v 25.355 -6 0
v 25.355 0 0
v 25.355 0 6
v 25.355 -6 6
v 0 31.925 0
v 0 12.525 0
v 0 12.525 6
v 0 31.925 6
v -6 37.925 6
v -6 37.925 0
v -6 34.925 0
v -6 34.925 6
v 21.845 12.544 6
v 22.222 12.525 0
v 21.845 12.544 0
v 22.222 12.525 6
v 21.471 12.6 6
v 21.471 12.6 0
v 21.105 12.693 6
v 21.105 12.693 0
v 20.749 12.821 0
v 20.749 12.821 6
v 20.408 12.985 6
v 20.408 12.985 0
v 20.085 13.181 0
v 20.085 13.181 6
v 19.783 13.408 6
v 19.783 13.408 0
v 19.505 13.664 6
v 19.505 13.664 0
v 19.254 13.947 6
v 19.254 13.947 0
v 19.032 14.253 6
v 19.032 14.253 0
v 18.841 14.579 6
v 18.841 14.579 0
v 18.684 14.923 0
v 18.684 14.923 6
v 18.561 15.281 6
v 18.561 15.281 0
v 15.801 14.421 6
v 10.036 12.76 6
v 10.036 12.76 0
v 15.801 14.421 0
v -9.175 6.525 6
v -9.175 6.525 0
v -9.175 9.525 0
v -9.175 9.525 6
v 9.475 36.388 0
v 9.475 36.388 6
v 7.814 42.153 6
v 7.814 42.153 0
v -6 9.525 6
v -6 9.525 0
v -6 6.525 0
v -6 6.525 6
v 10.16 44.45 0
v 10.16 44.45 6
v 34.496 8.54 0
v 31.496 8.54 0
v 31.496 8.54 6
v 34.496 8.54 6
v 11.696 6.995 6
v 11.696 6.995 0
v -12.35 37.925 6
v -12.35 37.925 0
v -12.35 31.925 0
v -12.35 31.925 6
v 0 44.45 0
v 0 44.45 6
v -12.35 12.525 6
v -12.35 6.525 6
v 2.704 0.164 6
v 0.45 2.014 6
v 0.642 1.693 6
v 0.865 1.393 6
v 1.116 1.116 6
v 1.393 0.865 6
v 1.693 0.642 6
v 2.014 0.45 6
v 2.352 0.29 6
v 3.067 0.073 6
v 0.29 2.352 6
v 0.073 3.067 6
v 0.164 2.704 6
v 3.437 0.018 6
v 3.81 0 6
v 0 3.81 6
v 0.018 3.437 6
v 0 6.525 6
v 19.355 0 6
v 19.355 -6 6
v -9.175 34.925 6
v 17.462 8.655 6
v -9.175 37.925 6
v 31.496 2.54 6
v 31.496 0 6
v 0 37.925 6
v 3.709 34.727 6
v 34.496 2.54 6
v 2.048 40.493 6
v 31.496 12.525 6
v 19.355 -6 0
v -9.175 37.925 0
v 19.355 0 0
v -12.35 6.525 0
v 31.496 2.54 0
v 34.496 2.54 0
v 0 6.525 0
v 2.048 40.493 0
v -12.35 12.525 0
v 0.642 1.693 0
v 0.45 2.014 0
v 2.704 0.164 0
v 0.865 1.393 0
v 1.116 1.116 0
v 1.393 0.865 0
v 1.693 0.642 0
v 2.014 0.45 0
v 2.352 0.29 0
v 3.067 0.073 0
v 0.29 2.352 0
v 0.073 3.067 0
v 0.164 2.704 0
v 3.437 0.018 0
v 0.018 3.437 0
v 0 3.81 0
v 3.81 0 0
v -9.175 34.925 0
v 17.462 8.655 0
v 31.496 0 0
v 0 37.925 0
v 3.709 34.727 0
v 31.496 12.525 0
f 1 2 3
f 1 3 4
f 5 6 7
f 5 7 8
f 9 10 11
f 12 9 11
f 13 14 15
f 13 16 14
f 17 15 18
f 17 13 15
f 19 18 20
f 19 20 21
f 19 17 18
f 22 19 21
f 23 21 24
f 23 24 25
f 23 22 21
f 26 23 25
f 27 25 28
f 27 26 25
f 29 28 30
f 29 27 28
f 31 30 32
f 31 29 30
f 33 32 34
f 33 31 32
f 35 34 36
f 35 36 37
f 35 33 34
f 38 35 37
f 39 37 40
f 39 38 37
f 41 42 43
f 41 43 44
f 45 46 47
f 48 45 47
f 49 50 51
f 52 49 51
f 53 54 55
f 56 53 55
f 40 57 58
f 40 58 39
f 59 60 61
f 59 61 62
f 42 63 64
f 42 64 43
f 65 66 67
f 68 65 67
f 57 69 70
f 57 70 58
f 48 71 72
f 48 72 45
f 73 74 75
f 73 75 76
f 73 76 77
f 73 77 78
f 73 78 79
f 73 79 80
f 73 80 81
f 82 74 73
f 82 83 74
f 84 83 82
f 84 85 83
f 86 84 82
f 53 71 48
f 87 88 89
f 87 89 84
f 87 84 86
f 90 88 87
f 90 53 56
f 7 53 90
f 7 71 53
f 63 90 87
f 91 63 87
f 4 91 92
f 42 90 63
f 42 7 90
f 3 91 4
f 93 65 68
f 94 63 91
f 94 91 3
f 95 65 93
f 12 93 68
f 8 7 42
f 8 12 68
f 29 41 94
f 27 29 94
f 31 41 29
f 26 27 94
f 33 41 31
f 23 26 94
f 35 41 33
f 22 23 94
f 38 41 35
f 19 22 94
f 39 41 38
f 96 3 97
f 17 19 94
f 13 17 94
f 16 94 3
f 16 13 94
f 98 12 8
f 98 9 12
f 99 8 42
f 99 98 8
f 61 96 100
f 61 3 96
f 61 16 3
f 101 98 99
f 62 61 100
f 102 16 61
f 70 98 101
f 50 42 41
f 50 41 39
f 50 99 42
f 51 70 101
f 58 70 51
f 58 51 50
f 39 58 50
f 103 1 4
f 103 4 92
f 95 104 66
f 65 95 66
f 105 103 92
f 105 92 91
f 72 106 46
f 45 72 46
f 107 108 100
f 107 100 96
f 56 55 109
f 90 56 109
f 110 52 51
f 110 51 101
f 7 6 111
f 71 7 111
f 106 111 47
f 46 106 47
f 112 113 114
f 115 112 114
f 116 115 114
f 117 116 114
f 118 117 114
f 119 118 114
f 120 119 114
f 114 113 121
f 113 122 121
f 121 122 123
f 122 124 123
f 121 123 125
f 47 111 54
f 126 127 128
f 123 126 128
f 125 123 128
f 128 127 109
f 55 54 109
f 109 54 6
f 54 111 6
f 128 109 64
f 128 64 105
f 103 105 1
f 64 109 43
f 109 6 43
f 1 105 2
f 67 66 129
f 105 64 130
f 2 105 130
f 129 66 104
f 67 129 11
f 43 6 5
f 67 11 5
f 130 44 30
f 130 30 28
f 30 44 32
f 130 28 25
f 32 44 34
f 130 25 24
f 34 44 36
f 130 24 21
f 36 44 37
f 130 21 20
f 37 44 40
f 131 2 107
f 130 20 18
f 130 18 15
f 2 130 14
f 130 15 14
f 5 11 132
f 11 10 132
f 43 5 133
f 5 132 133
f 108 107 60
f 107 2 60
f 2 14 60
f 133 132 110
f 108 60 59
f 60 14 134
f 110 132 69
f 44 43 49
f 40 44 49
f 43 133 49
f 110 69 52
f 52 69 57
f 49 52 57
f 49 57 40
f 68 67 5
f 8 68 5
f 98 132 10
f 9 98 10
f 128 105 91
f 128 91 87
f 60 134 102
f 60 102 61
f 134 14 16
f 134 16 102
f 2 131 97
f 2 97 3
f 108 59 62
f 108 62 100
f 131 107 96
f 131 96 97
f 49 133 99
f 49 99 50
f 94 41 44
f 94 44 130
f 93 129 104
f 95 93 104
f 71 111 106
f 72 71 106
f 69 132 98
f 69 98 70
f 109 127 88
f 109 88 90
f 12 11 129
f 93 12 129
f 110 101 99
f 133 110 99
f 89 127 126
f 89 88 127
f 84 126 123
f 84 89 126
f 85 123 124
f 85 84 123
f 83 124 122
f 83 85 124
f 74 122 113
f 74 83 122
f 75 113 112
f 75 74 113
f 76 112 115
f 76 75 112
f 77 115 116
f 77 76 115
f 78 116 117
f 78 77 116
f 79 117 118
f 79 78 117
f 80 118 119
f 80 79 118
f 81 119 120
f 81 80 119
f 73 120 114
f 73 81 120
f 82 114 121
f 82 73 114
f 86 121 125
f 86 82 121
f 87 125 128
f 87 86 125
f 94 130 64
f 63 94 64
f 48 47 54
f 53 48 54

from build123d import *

# Parameters (mm, degrees)
BOSS_EXTRUDE1_DEPTH = 6
FILLET1_R           = 3.81
CUT_EXTRUDE1_DEPTH  = 57.584242648


with BuildPart() as part:
    # Sketch1 → Boss-Extrude1 (new body)
    with BuildSketch(Plane.XY):
        Polygon((-12.35, 31.925), (0, 31.925), (0, 37.925), (-6, 37.925), (-6, 34.925), (-9.175, 34.925), (-9.175, 37.925), (-12.35, 37.925), align=None)
        Polygon((19.3548, 12.525), (31.496, 12.525), (31.496, 8.54), (34.496, 8.54), (34.496, 2.54), (31.496, 2.54), (31.496, 0), (25.3548, 0), (25.3548, -6), (19.3548, -6), (19.3548, 0), (0, 0), (0, 44.45), (10.16, 44.45), align=None)
        Polygon((-6, 6.525), (0, 6.525), (0, 12.525), (-12.35, 12.525), (-12.35, 6.525), (-9.175, 6.525), (-9.175, 9.525), (-6, 9.525), align=None)
    extrude(amount=BOSS_EXTRUDE1_DEPTH)

    # Fillet1
    fillet1_edges = [part.edges().sort_by_distance(p)[0] for p in [
        (19.3548, 12.525, 3),
        (0, 0, 3),
    ]]
    fillet(fillet1_edges, radius=FILLET1_R)

    # Sketch3 → Cut-Extrude1 (cut, through all)
    with BuildSketch(Plane.XY.offset(6)):
        Polygon((3.708914399, 34.727201635), (9.47454486, 36.387775447), (7.813971047, 42.153405908), (2.048340586, 40.492832096), align=None)
        Polygon((15.801331085, 14.42072339), (17.461904898, 8.655092929), (11.696274437, 6.994519117), (10.035700624, 12.760149578), align=None)
    extrude(amount=-CUT_EXTRUDE1_DEPTH, mode=Mode.SUBTRACT)


solid = part.part
